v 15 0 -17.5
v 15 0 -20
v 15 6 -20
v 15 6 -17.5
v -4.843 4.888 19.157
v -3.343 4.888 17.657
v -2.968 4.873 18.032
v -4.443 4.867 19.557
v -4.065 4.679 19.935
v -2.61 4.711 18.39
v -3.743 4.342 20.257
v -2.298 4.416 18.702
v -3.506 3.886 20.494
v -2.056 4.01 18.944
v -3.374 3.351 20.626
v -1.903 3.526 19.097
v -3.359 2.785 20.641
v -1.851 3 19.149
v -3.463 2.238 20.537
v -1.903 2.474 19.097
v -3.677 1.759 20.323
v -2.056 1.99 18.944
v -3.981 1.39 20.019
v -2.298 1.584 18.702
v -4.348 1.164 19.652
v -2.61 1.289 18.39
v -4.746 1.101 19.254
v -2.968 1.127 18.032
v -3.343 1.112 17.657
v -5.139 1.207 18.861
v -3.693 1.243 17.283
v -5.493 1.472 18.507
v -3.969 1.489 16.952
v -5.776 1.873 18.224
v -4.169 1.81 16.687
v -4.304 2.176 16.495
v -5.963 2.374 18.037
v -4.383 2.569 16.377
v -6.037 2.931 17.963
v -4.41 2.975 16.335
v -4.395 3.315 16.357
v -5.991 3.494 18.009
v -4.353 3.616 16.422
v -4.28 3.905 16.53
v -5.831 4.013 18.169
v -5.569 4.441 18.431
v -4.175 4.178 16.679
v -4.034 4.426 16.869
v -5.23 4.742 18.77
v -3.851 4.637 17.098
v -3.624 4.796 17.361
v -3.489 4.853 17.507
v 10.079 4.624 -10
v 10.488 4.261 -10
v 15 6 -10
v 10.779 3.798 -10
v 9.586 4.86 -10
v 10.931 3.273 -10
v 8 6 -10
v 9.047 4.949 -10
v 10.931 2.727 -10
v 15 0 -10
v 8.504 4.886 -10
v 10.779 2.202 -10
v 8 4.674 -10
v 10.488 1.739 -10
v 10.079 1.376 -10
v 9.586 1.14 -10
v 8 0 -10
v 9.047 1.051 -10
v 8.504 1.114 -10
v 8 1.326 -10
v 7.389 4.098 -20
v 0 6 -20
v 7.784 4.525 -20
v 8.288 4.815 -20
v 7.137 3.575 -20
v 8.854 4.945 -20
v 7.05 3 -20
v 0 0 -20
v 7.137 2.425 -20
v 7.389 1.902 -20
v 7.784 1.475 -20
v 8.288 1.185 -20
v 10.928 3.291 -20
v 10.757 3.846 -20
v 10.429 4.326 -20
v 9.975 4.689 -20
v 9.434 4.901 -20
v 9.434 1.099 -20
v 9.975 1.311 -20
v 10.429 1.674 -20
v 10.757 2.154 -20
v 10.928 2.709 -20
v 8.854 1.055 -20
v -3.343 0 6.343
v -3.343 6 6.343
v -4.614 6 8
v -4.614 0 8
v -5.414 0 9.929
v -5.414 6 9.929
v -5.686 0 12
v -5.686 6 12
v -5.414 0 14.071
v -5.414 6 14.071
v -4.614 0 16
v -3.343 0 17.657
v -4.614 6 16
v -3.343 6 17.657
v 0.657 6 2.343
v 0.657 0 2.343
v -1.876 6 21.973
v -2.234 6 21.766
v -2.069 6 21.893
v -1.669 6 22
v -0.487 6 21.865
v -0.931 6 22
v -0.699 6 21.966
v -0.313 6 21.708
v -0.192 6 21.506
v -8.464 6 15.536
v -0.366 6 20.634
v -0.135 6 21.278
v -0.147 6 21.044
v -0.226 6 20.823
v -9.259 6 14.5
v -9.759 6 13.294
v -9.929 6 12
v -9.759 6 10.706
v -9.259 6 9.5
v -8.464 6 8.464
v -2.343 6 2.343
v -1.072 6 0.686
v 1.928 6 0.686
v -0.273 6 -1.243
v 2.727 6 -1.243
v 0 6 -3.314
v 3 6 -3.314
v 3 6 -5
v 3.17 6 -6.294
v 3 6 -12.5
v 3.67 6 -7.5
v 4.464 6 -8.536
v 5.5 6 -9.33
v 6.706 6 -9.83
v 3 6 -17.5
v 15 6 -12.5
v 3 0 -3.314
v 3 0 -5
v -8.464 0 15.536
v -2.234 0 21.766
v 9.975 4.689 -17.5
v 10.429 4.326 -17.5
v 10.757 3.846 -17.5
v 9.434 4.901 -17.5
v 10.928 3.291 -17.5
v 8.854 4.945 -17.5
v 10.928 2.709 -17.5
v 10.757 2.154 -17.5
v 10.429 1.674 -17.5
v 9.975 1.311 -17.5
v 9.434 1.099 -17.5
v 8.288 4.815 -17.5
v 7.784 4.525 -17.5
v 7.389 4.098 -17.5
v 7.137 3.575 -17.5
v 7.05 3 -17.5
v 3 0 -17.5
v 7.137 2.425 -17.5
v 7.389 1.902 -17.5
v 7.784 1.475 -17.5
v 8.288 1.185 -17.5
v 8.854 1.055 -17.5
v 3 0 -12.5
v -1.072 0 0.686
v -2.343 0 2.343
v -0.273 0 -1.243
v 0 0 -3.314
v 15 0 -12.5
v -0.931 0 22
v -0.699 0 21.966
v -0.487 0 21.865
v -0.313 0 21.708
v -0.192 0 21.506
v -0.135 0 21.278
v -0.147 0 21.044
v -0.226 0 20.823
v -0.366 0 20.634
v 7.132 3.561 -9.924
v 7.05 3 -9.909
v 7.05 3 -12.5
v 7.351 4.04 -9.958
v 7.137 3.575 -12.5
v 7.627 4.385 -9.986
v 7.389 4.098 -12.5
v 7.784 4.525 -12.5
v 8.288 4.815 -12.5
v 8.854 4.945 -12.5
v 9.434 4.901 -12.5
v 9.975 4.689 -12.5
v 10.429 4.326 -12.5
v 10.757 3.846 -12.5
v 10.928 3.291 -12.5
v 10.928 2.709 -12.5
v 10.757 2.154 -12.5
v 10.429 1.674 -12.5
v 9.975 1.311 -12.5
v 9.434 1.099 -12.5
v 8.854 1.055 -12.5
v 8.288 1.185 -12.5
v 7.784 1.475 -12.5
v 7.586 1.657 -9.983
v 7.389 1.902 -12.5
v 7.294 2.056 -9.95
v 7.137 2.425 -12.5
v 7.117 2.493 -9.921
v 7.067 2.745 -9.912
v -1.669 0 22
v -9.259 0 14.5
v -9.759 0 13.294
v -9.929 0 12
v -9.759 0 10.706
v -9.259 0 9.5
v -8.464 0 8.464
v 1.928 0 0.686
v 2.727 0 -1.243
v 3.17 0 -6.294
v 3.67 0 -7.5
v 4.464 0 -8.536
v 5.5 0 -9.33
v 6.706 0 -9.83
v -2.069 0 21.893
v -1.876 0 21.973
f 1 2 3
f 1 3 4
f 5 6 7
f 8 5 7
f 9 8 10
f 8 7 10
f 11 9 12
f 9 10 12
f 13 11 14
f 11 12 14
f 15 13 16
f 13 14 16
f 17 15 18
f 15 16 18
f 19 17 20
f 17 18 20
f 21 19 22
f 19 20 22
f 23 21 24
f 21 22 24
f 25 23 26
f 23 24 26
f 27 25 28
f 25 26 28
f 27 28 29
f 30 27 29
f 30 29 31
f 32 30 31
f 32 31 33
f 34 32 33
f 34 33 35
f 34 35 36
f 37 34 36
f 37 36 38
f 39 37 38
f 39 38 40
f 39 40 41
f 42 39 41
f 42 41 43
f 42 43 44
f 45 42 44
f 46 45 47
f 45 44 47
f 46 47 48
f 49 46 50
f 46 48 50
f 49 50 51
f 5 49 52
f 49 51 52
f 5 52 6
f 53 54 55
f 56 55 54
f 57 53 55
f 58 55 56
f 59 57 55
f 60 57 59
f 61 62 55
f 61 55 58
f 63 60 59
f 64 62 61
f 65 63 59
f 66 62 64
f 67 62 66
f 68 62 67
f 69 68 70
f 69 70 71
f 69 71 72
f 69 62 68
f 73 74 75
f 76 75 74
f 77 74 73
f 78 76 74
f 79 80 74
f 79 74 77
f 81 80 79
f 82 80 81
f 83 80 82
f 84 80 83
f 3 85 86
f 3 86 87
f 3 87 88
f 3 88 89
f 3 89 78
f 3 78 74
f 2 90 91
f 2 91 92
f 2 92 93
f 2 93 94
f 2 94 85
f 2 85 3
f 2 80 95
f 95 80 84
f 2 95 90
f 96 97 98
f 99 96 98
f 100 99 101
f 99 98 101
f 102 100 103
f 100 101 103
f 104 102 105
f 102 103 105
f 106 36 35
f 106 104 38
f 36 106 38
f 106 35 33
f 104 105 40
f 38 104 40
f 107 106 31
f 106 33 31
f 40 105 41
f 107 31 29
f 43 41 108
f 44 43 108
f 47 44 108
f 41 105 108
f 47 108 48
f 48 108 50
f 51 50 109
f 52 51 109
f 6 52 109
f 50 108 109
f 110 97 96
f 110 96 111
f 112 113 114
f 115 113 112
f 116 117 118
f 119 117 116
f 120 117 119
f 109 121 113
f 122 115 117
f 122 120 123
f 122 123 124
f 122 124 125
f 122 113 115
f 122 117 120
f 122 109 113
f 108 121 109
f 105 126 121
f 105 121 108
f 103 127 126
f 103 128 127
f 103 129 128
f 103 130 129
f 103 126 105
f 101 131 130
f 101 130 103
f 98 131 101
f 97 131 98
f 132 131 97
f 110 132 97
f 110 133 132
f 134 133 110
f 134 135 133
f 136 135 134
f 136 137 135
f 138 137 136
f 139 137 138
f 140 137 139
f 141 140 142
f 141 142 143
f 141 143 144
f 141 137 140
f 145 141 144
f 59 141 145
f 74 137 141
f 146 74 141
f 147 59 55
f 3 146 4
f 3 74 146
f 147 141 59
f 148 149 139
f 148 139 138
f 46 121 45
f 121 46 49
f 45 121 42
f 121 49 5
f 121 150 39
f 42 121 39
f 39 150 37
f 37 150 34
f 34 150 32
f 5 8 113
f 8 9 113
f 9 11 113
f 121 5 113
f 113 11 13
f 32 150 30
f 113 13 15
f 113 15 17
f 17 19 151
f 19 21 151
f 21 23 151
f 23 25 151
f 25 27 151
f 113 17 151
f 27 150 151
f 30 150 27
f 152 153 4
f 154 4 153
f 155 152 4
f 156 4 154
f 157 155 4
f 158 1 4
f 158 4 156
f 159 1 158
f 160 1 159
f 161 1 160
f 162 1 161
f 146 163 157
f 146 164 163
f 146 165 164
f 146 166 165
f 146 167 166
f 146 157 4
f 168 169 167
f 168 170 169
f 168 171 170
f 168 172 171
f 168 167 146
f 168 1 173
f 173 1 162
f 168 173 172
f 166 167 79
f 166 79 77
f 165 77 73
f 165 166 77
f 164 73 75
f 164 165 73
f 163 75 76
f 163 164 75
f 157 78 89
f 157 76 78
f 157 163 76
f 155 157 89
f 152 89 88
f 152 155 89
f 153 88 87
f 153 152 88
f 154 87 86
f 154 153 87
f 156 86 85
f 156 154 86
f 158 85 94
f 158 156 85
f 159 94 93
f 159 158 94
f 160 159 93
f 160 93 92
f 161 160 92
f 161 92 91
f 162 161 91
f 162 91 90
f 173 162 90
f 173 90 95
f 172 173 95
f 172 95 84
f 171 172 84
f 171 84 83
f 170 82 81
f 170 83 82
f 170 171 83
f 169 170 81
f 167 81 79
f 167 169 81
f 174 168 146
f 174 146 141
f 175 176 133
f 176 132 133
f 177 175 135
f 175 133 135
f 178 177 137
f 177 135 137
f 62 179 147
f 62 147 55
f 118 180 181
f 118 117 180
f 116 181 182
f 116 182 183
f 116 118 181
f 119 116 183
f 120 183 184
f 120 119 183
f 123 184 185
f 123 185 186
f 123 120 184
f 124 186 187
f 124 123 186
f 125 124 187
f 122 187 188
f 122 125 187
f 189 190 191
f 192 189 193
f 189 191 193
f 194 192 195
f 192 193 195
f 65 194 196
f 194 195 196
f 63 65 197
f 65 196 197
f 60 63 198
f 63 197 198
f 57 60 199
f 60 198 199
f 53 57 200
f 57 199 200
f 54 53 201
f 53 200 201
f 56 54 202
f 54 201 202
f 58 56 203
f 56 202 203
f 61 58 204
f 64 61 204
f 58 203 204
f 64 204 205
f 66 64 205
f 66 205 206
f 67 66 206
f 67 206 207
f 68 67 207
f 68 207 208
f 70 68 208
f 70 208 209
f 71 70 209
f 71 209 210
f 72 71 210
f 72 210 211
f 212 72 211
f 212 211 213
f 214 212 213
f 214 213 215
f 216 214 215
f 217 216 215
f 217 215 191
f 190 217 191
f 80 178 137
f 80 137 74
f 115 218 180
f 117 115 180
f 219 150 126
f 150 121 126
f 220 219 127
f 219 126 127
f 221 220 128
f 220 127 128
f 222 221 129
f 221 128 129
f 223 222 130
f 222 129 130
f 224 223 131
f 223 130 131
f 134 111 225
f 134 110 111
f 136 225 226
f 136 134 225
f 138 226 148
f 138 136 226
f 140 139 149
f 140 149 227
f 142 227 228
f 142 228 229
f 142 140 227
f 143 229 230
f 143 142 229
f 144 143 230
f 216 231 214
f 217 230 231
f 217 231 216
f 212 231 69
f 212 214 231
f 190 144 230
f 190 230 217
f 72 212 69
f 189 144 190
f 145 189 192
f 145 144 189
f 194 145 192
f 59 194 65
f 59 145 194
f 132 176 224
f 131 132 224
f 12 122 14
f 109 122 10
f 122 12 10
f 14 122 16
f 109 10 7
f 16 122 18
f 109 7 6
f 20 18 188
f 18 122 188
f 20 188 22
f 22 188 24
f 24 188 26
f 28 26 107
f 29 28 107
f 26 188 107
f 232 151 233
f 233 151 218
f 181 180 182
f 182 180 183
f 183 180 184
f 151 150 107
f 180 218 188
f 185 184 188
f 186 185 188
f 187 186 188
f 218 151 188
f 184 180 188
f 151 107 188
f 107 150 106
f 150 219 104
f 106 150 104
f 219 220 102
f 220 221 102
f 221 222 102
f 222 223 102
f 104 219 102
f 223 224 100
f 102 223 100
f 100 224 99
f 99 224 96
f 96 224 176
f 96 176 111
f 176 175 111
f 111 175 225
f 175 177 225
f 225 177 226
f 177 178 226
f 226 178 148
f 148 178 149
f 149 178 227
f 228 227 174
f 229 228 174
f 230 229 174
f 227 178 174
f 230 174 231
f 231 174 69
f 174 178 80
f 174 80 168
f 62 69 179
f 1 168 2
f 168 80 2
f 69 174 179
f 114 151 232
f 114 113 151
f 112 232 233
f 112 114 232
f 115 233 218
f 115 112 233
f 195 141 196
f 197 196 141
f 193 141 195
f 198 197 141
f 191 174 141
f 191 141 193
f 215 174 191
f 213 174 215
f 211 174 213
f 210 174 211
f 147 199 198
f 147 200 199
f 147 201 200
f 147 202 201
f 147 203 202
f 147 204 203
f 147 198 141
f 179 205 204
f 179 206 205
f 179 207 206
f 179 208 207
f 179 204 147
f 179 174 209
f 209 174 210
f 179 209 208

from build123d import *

# Parameters (mm, degrees)
SALIENTE_EXTRUIR1_DEPTH    = 6
REDONDEO1_R                = 8
REDONDEO2_R                = 5
REDONDEO3_R                = 8
REDONDEO4_R                = 0.8
CORTAR_EXTRUIR1_DEPTH      = 6
CORTAR_EXTRUIR1_DEPTH_BACK = 6
CROQUIS2_R                 = 1.9
REDONDEO5_R                = 5
CORTAR_EXTRUIR2_DEPTH      = 39.095275313
CORTAR_EXTRUIR2_DEPTH_BACK = 10
CROQUIS3_R                 = 1.95


with BuildPart() as part:
    # Croquis1 → Saliente-Extruir1 (new body)
    with BuildSketch(Plane(origin=(0, 0, 0), x_dir=(1, 0, 0), z_dir=(0, 1, 0))):
        Polygon((0, 20), (0, 0), (-12, -12), (-2, -22), (1, -22), (-9, -12), (3, 0), (3, 10), (15, 10), (15, 12.5), (3, 12.5), (3, 17.5), (15, 17.5), (15, 20), align=None)
    extrude(amount=SALIENTE_EXTRUIR1_DEPTH)

    # Redondeo1
    redondeo1_edges = [part.edges().sort_by_distance(p)[0] for p in [
        (-9, 3, 12),
    ]]
    fillet(redondeo1_edges, radius=REDONDEO1_R)

    # Redondeo2
    redondeo2_edges = [part.edges().sort_by_distance(p)[0] for p in [
        (-12, 3, 12),
    ]]
    fillet(redondeo2_edges, radius=REDONDEO2_R)

    # Redondeo3
    redondeo3_edges = [part.edges().sort_by_distance(p)[0] for p in [
        (0, 3, 0),
        (3, 3, 0),
    ]]
    fillet(redondeo3_edges, radius=REDONDEO3_R)

    # Redondeo4
    redondeo4_edges = [part.edges().sort_by_distance(p)[0] for p in [
        (-2, 3, 22),
        (1, 3, 22),
    ]]
    fillet(redondeo4_edges, radius=REDONDEO4_R)

    # Croquis2 → Cortar-Extruir1 (cut, two sides: drawn at the far end of the back side and taken through both)
    with BuildSketch(Plane(origin=(-10.5, 0, 10.5), x_dir=(-0.7071067811865541, 0, -0.7071067811865409), z_dir=(0.7071067811865409, 0, -0.7071067811865541)).offset(-CORTAR_EXTRUIR1_DEPTH_BACK)):
        with Locations((-10.332085117, 3)):
            Circle(CROQUIS2_R)
    extrude(amount=CORTAR_EXTRUIR1_DEPTH + CORTAR_EXTRUIR1_DEPTH_BACK, mode=Mode.SUBTRACT)

    # Redondeo5
    redondeo5_edges = [part.edges().sort_by_distance(p)[0] for p in [
        (3, 3, -10),
    ]]
    fillet(redondeo5_edges, radius=REDONDEO5_R)

    # Croquis3 → Cortar-Extruir2 (cut, two sides: drawn at the far end of the back side and taken through both)
    with BuildSketch(Plane(origin=(0, 0, -12.5), x_dir=(-1, 0, 0), z_dir=(0, 0, -1)).offset(-CORTAR_EXTRUIR2_DEPTH_BACK)):
        with Locations((-9, 3)):
            Circle(CROQUIS3_R)
    extrude(amount=CORTAR_EXTRUIR2_DEPTH + CORTAR_EXTRUIR2_DEPTH_BACK, mode=Mode.SUBTRACT)


solid = part.part
